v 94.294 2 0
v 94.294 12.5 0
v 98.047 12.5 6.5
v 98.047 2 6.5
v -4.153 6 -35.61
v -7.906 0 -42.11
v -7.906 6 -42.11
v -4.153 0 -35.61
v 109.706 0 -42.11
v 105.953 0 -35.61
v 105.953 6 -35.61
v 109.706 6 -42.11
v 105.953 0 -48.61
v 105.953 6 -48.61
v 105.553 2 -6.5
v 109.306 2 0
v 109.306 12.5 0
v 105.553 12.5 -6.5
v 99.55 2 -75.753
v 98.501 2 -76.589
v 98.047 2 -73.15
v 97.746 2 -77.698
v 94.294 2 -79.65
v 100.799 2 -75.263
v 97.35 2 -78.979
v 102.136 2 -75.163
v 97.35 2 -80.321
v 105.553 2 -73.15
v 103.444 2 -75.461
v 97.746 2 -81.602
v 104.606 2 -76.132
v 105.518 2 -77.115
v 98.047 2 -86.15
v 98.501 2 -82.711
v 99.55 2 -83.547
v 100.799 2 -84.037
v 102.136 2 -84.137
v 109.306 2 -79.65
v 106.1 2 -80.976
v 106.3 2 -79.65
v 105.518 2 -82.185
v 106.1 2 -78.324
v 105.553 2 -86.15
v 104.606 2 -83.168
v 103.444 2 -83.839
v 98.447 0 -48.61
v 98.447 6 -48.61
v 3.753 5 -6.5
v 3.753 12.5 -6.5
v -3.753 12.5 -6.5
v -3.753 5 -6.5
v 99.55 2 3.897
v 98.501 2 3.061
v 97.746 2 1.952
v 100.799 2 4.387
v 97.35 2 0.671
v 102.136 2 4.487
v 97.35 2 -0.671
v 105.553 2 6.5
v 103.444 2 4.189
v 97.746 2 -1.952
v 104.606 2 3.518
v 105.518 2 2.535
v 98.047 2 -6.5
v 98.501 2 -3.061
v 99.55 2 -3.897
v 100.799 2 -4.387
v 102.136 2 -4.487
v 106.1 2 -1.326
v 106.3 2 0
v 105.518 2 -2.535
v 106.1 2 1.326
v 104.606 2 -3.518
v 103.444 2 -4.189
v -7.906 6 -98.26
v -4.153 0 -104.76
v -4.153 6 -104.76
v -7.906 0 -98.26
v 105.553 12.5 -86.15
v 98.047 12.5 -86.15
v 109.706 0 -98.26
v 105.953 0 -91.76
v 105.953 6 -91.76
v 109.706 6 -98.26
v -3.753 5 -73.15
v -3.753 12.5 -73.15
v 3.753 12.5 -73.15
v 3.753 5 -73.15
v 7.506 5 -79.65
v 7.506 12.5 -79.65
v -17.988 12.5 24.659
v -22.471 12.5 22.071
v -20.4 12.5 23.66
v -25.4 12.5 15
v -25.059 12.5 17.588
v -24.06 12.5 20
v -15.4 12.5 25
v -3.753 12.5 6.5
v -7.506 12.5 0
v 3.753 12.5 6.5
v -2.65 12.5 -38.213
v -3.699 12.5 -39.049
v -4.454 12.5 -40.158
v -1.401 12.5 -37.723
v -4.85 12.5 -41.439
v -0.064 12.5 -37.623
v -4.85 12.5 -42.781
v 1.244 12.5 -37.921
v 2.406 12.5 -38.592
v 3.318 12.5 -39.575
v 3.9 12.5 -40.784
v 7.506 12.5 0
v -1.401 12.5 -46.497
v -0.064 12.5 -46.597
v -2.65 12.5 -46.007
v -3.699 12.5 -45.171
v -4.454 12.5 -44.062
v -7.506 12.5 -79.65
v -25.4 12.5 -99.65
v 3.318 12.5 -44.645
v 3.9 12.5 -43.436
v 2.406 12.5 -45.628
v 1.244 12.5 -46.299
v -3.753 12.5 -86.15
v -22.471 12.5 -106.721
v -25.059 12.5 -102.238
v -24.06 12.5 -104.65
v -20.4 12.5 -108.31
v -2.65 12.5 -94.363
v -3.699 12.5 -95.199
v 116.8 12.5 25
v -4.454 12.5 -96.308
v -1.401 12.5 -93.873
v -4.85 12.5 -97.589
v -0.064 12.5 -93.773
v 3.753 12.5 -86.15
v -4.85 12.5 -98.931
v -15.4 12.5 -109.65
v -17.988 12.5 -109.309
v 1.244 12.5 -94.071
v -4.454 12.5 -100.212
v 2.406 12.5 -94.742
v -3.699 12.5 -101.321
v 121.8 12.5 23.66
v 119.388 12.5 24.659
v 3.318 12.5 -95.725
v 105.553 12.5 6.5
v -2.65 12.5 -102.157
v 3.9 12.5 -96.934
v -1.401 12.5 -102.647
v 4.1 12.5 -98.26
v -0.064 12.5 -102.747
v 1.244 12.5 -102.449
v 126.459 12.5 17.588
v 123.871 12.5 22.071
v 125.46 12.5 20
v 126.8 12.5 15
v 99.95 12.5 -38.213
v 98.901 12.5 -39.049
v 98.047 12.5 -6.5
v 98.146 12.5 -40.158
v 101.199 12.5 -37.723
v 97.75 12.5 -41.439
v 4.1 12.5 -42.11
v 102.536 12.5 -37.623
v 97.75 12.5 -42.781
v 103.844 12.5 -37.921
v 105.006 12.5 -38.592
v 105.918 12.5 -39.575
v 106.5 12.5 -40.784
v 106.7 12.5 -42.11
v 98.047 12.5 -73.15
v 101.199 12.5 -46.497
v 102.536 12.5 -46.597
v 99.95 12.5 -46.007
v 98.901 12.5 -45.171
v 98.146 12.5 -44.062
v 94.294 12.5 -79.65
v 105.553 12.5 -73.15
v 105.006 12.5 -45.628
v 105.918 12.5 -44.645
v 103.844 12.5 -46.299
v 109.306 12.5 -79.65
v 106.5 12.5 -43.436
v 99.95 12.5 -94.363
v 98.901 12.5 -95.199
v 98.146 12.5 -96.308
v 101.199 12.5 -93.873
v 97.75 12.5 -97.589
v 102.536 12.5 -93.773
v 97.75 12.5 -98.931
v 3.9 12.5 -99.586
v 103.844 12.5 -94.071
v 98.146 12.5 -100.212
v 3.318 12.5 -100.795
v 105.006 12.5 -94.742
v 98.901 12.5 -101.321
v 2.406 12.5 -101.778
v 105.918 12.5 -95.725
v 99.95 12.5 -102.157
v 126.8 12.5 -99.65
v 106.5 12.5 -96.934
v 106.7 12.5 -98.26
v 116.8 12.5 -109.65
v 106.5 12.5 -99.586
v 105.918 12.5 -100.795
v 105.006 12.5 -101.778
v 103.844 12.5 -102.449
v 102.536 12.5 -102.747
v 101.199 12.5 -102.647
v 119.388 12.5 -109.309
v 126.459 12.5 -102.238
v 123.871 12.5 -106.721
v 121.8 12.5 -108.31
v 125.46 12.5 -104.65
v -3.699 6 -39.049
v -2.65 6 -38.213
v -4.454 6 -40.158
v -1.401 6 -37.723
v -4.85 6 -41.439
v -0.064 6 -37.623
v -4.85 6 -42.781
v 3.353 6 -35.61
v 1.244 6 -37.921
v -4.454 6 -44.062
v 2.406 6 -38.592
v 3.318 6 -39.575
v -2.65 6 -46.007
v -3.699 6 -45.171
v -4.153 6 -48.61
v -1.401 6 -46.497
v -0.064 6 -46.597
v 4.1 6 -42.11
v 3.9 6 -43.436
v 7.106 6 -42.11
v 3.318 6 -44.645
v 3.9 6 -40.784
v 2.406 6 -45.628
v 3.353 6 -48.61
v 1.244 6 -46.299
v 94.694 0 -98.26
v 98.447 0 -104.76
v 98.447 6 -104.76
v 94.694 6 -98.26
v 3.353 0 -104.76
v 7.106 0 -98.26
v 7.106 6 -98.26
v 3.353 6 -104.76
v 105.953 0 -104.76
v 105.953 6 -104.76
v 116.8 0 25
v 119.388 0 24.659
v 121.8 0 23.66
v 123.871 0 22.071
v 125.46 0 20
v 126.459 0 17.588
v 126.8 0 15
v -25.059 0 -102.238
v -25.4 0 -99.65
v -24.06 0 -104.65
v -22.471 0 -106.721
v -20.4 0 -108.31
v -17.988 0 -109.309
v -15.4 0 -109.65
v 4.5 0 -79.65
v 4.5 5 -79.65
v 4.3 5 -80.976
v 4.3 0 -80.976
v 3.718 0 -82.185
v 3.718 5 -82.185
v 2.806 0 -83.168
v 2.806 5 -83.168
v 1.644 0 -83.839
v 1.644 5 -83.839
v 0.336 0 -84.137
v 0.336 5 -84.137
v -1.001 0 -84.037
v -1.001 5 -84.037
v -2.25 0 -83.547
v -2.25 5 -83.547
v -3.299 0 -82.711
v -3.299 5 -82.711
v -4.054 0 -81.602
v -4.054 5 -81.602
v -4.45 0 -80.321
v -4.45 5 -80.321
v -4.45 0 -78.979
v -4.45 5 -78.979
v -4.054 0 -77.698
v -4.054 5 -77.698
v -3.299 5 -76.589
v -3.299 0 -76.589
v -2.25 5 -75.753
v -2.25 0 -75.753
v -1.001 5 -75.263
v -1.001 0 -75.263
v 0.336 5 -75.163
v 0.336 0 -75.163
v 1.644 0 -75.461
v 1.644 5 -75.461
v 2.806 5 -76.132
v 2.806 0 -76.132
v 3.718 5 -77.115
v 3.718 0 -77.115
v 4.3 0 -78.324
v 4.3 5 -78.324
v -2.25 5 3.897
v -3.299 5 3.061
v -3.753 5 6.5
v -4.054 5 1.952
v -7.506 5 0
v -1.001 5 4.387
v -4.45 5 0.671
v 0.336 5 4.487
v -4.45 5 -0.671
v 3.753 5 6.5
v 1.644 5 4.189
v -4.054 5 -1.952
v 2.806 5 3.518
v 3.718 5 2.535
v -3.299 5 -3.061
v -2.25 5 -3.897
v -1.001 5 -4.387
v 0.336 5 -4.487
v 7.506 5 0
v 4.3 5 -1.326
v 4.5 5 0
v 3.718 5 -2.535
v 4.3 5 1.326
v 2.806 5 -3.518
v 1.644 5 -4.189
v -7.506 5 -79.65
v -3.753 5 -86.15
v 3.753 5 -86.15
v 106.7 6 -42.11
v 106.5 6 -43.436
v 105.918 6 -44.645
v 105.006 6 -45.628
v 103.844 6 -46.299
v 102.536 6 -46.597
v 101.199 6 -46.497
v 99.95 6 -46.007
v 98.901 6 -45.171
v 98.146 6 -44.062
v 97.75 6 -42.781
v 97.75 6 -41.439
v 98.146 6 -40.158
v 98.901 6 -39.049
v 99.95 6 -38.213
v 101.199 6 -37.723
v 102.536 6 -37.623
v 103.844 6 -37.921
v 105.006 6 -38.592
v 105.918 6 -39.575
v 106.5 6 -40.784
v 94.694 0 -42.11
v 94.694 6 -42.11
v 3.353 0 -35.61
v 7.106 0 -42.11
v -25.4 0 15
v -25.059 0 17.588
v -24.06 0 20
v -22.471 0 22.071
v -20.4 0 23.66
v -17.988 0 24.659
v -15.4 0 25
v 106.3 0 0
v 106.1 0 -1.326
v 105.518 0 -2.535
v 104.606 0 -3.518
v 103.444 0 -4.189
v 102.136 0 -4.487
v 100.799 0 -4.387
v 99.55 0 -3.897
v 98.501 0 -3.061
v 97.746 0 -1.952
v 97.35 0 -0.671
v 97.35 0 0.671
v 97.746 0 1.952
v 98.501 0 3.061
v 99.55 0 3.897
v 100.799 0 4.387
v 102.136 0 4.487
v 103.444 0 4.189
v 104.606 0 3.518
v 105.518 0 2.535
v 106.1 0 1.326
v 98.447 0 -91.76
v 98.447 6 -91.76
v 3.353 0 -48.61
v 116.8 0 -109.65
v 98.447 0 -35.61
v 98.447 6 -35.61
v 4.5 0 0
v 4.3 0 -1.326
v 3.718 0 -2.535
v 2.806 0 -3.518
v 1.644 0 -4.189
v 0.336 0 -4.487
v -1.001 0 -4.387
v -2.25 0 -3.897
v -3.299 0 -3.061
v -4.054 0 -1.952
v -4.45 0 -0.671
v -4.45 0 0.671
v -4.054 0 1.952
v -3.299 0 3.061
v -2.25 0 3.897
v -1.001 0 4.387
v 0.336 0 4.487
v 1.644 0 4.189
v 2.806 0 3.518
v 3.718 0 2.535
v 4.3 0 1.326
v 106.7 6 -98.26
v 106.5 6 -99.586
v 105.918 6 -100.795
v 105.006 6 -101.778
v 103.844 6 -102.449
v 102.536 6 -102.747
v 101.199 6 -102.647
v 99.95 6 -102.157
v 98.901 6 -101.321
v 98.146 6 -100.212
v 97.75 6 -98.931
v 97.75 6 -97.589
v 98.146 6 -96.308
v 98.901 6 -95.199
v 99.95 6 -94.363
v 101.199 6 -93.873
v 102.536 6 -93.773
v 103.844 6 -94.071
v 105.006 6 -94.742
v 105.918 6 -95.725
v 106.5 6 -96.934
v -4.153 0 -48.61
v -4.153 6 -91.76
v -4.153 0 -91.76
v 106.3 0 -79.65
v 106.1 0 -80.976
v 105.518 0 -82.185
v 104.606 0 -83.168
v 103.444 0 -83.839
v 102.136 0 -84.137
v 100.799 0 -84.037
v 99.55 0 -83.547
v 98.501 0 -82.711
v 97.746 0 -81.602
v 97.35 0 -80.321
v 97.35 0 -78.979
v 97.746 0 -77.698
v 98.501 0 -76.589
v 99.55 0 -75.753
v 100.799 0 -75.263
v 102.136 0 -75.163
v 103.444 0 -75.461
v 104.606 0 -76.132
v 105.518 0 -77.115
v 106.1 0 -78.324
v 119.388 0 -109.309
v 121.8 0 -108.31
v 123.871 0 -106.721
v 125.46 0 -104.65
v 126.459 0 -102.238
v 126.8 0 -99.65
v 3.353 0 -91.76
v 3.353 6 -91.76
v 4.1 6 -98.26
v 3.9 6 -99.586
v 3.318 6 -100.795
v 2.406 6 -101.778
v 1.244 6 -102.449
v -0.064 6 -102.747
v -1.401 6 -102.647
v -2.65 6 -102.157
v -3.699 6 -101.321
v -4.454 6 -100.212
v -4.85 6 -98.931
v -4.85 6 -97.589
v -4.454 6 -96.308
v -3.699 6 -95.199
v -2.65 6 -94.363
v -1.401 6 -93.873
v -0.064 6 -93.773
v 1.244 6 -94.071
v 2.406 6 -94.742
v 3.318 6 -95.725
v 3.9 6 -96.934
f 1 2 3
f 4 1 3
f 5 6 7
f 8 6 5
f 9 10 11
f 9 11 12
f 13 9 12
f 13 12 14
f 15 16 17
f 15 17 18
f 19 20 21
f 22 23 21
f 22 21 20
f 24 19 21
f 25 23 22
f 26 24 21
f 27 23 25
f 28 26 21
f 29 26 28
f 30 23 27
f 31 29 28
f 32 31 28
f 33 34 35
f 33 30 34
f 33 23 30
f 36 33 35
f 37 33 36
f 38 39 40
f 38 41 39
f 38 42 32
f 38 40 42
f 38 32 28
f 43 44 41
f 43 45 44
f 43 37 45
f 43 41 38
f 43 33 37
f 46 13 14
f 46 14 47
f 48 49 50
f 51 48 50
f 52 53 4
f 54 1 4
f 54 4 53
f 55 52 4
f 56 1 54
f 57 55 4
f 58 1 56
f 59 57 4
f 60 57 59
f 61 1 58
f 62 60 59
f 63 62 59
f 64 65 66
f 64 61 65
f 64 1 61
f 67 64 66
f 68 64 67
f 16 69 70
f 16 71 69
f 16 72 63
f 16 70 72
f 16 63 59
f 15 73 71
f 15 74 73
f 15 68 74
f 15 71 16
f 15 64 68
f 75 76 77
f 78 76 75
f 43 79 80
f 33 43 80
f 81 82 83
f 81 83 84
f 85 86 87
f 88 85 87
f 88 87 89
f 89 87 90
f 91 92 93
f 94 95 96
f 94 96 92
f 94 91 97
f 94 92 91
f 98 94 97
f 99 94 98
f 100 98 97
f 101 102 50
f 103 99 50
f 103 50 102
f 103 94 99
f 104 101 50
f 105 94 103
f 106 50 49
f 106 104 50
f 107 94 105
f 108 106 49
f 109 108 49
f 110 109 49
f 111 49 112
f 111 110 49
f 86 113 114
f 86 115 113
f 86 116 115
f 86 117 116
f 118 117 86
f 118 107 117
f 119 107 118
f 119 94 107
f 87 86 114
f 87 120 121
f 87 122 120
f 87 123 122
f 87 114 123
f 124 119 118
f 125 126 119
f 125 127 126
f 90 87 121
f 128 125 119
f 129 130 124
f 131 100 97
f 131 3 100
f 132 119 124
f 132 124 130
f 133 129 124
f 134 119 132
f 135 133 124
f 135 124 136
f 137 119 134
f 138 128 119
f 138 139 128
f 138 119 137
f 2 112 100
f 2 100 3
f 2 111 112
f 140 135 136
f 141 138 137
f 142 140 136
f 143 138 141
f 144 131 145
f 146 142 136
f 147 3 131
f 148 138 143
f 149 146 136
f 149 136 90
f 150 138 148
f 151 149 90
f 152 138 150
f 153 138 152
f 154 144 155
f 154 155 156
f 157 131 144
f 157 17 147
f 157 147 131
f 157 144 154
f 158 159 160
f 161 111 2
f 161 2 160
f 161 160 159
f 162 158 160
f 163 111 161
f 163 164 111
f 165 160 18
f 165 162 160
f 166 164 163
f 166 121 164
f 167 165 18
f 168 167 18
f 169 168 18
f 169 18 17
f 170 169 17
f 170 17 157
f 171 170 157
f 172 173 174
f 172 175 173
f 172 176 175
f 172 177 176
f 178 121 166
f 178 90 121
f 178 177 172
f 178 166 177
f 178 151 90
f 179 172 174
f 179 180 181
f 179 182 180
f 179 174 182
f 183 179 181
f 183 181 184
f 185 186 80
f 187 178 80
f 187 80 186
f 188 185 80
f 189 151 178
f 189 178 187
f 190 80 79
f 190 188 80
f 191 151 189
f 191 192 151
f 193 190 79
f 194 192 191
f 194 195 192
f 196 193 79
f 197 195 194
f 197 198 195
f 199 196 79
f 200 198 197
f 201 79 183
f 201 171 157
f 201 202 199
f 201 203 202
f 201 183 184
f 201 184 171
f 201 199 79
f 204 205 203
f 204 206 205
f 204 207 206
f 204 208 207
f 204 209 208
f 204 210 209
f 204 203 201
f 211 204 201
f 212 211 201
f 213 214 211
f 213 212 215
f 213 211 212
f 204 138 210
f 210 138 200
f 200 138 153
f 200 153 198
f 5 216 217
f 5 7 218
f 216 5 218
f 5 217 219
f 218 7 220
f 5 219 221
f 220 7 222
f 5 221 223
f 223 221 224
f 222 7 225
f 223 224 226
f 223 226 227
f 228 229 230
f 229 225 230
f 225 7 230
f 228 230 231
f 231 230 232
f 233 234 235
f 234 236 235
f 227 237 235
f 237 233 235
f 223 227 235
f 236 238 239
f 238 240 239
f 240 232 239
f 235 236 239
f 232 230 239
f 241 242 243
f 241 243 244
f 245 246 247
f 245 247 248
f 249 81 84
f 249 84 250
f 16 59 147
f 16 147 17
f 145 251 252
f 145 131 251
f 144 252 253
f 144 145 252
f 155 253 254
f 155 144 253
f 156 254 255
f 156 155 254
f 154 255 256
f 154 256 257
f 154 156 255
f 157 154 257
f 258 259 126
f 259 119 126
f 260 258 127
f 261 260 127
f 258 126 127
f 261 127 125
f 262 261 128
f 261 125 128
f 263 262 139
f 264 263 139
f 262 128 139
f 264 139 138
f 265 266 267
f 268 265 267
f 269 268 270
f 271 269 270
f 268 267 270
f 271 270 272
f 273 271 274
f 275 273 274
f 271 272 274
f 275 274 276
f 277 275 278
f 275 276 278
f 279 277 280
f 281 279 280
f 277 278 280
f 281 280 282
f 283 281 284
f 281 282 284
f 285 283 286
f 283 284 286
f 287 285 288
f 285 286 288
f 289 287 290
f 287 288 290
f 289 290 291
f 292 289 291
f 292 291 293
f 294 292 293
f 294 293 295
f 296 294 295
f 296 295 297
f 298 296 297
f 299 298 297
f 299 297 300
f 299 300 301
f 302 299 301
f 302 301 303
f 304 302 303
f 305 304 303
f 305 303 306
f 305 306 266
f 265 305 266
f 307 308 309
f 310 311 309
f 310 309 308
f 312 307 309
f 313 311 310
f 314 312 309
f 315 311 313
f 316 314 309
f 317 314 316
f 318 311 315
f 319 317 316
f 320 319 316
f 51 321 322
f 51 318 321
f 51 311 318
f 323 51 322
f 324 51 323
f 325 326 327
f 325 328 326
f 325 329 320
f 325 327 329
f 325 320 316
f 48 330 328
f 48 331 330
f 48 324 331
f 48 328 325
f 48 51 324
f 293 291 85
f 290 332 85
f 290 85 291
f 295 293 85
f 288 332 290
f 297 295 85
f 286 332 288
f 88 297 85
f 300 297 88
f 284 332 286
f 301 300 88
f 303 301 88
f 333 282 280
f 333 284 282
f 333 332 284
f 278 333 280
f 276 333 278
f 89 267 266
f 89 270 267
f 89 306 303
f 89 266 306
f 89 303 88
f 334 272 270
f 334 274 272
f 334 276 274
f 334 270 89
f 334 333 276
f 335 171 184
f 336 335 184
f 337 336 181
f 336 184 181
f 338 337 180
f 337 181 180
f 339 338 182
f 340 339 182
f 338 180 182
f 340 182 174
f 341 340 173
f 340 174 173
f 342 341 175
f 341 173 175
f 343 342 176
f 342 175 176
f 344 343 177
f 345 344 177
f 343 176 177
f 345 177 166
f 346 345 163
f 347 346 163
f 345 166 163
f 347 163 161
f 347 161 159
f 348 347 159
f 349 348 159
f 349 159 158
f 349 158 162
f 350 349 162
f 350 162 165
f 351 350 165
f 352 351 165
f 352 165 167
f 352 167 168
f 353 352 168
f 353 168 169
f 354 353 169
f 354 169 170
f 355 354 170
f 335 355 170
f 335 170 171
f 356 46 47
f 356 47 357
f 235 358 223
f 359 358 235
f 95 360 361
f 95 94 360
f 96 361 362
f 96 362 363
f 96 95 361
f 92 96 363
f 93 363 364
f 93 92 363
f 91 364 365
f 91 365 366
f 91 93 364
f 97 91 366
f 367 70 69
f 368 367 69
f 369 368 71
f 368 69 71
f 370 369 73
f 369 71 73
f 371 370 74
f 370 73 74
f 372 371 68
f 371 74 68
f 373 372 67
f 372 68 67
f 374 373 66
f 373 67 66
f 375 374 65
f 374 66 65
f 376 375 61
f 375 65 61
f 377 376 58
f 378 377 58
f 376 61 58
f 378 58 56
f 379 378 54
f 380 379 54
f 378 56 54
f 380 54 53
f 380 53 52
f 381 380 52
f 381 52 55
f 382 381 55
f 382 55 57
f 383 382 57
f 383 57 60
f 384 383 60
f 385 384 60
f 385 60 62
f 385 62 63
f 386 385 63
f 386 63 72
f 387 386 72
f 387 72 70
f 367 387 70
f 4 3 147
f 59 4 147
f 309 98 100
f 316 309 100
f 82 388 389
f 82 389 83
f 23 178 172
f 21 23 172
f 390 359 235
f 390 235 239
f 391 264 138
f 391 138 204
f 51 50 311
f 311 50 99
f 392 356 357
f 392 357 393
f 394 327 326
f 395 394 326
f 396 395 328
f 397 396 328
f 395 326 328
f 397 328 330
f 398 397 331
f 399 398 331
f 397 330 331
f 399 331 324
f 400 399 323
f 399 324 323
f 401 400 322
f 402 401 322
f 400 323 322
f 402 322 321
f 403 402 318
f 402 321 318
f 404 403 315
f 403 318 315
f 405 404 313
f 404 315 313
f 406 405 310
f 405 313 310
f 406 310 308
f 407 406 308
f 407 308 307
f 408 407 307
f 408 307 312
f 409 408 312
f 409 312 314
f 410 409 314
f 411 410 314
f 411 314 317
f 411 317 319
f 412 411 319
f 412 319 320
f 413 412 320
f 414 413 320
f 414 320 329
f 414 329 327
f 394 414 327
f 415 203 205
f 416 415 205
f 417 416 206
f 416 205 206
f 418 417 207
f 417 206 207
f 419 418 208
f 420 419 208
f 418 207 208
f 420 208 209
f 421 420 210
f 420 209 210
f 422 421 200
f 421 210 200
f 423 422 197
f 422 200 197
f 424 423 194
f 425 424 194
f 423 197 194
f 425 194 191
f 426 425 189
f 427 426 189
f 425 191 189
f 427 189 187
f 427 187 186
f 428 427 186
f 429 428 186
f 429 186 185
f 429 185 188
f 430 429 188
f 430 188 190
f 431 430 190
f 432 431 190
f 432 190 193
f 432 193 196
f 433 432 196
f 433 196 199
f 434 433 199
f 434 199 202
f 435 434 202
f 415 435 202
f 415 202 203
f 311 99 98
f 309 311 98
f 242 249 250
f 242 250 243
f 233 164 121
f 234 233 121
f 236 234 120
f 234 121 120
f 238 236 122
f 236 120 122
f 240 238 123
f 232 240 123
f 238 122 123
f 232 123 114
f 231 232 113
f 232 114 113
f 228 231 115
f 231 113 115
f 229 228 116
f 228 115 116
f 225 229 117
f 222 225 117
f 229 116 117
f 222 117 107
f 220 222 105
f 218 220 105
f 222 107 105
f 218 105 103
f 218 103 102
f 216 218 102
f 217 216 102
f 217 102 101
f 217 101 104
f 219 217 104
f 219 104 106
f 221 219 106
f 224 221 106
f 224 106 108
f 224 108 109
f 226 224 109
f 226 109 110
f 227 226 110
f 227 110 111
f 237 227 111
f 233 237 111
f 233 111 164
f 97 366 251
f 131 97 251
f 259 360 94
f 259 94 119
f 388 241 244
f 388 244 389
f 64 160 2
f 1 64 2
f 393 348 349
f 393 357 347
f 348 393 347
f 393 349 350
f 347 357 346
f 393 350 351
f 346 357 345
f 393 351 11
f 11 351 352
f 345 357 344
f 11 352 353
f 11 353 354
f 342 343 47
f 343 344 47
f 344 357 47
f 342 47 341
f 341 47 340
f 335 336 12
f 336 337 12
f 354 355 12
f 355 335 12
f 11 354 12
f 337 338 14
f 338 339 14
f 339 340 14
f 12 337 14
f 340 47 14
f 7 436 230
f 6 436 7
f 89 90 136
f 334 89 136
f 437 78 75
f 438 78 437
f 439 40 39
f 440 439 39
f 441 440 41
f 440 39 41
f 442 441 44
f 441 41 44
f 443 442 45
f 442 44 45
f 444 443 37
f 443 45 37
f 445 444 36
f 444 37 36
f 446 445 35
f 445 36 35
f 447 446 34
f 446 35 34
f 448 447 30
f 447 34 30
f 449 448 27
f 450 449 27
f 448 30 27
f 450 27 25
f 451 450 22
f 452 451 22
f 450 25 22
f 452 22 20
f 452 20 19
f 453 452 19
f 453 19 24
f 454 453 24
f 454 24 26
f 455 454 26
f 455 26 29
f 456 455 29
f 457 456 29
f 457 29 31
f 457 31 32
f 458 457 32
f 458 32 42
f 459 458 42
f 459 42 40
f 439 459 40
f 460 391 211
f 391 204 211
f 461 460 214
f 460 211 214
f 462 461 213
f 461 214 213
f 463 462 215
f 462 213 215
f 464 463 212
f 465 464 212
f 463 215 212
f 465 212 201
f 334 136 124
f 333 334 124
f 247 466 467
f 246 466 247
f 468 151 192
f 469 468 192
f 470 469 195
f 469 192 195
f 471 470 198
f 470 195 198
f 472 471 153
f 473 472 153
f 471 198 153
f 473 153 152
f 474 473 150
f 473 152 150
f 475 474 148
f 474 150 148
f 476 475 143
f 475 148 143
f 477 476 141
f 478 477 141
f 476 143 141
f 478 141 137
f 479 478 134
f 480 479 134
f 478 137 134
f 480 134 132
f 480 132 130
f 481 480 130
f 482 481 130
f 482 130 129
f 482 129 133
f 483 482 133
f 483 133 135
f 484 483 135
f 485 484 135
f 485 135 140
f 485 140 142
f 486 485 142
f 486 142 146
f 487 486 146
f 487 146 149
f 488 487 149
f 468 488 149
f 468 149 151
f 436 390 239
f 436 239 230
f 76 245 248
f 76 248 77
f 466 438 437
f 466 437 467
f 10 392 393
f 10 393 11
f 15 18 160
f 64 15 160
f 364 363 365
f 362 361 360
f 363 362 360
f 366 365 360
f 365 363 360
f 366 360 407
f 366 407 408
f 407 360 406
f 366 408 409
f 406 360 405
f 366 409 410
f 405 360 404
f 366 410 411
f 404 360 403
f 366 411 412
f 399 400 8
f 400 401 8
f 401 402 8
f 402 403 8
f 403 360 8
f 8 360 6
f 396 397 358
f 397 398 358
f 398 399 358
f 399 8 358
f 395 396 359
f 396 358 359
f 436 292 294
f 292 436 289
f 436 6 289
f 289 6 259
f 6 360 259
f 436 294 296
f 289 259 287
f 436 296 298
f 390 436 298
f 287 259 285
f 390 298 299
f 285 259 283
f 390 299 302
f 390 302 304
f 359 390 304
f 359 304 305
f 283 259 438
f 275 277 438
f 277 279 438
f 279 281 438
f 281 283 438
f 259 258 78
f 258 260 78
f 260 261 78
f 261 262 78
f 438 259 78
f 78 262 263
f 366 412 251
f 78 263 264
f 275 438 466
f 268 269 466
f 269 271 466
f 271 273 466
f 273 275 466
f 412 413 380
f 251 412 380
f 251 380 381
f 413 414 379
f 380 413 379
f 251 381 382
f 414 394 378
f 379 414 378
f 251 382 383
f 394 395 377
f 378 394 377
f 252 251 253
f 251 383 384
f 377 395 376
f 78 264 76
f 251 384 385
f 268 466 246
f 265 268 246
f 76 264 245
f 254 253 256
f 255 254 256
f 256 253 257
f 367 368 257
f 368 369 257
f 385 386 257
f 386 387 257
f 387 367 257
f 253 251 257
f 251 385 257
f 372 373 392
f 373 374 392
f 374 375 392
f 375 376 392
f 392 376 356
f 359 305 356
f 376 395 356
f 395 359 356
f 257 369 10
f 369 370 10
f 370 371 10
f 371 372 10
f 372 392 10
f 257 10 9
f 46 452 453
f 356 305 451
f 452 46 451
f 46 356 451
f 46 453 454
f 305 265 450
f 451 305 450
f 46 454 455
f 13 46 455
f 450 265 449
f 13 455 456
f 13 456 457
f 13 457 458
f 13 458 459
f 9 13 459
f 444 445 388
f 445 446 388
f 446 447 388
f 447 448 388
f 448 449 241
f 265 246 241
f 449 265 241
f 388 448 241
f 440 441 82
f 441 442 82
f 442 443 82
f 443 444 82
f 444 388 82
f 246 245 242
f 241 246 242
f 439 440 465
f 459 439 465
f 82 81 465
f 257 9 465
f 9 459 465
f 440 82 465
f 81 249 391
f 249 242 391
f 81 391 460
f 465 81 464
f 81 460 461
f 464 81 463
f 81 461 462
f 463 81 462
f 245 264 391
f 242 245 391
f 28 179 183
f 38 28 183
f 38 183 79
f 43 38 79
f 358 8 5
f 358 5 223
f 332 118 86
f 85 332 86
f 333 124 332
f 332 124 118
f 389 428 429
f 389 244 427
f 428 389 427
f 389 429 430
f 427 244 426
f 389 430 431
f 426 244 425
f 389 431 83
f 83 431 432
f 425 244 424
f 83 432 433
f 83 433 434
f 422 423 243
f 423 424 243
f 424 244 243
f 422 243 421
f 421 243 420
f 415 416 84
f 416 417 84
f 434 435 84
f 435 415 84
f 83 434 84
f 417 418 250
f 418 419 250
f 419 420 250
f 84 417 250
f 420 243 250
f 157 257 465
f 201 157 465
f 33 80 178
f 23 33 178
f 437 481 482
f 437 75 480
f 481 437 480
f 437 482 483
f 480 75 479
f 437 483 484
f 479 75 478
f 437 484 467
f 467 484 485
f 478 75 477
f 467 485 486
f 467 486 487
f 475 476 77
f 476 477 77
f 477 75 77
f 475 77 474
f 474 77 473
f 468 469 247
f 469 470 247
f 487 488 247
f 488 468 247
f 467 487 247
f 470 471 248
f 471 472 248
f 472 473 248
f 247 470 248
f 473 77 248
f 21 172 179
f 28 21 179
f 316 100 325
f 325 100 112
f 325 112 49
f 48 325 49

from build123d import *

# Parameters (mm, degrees)
SKETCH1_W            = 152.20001
SKETCH1_H            = 134.65
BOSS_EXTRUDE1_DEPTH  = 12.5
M8_CLEARANCE_HOLE1_D = 9
M8_CLEARANCE_HOLE2_D = 9
FILLET1_R            = 10
CUT_EXTRUDE1_DEPTH   = 10.5
CUT_EXTRUDE2_DEPTH   = 7.5
CUT_EXTRUDE3_START   = -12.5
CUT_EXTRUDE3_DEPTH   = 6


with BuildPart() as part:
    # Sketch1 → Boss-Extrude1 (new body)
    with BuildSketch(Plane(origin=(0, 0, 0), x_dir=(1, 0, 0), z_dir=(0, 1, 0))):
        with Locations((50.699995, 42.325)):
            Rectangle(SKETCH1_W, SKETCH1_H)
    extrude(amount=BOSS_EXTRUDE1_DEPTH)

    # M8 Clearance Hole1 (through all)
    with Locations(Plane(origin=(0, 0, 0), x_dir=(-1, 0, 0), z_dir=(0, -1, 0))):
        with Locations((-102.19999, 42.11), (0.40001, 42.11), (0.40001, 98.26), (-102.19999, 98.26)):
            Hole(M8_CLEARANCE_HOLE1_D / 2)

    # M8 Clearance Hole2 (through all)
    with Locations(Plane(origin=(0, 0, 0), x_dir=(-1, 0, 0), z_dir=(0, -1, 0))):
        with Locations((-101.8, 0), (0, 0), (-101.8, 79.65), (0, 79.65)):
            Hole(M8_CLEARANCE_HOLE2_D / 2)

    # Fillet1
    fillet1_edges = [part.edges().sort_by_distance(p)[0] for p in [
        (-25.40001, 6.25, -109.65),
        (126.8, 6.25, -109.65),
        (126.8, 6.25, 25),
        (-25.40001, 6.25, 25),
    ]]
    fillet(fillet1_edges, radius=FILLET1_R)

    # Sketch12 → Cut-Extrude1 (cut)
    with BuildSketch(Plane(origin=(0, 12.5, 0), x_dir=(1, 0, 0), z_dir=(0, 1, 0))):
        Polygon((94.294446501, 79.65), (98.04722325, 73.15), (105.55277675, 73.15), (109.305553499, 79.65), (105.55277675, 86.15), (98.04722325, 86.15), align=None)
        Polygon((94.294446501, 0), (98.04722325, -6.5), (105.55277675, -6.5), (109.305553499, 0), (105.55277675, 6.5), (98.04722325, 6.5), align=None)
    extrude(amount=-CUT_EXTRUDE1_DEPTH, mode=Mode.SUBTRACT)

    # Sketch12<4> → Cut-Extrude2 (cut)
    with BuildSketch(Plane(origin=(0, 12.5, 0), x_dir=(1, 0, 0), z_dir=(0, 1, 0))):
        Polygon((7.505553499, 79.65), (3.75277675, 86.15), (-3.75277675, 86.15), (-7.505553499, 79.65), (-3.75277675, 73.15), (3.75277675, 73.15), align=None)
        Polygon((7.505553499, 0), (3.75277675, 6.5), (-3.75277675, 6.5), (-7.505553499, 0), (-3.75277675, -6.5), (3.75277675, -6.5), align=None)
    extrude(amount=-CUT_EXTRUDE2_DEPTH, mode=Mode.SUBTRACT)

    # Sketch12<5> → Cut-Extrude3 (cut)
    with BuildSketch(Plane(origin=(0, 12.5, 0), x_dir=(1, 0, 0), z_dir=(0, 1, 0)).offset(CUT_EXTRUDE3_START)):
        Polygon((7.105543499, 98.26), (3.35276675, 104.76), (-4.15278675, 104.76), (-7.905563499, 98.26), (-4.15278675, 91.76), (3.35276675, 91.76), align=None)
        Polygon((109.705543499, 98.26), (105.95276675, 104.76), (98.44721325, 104.76), (94.694436501, 98.26), (98.44721325, 91.76), (105.95276675, 91.76), align=None)
        Polygon((7.105543499, 42.11), (3.35276675, 48.61), (-4.15278675, 48.61), (-7.905563499, 42.11), (-4.15278675, 35.61), (3.35276675, 35.61), align=None)
        Polygon((109.705543499, 42.11), (105.95276675, 48.61), (98.44721325, 48.61), (94.694436501, 42.11), (98.44721325, 35.61), (105.95276675, 35.61), align=None)
    extrude(amount=CUT_EXTRUDE3_DEPTH, mode=Mode.SUBTRACT)


solid = part.part
